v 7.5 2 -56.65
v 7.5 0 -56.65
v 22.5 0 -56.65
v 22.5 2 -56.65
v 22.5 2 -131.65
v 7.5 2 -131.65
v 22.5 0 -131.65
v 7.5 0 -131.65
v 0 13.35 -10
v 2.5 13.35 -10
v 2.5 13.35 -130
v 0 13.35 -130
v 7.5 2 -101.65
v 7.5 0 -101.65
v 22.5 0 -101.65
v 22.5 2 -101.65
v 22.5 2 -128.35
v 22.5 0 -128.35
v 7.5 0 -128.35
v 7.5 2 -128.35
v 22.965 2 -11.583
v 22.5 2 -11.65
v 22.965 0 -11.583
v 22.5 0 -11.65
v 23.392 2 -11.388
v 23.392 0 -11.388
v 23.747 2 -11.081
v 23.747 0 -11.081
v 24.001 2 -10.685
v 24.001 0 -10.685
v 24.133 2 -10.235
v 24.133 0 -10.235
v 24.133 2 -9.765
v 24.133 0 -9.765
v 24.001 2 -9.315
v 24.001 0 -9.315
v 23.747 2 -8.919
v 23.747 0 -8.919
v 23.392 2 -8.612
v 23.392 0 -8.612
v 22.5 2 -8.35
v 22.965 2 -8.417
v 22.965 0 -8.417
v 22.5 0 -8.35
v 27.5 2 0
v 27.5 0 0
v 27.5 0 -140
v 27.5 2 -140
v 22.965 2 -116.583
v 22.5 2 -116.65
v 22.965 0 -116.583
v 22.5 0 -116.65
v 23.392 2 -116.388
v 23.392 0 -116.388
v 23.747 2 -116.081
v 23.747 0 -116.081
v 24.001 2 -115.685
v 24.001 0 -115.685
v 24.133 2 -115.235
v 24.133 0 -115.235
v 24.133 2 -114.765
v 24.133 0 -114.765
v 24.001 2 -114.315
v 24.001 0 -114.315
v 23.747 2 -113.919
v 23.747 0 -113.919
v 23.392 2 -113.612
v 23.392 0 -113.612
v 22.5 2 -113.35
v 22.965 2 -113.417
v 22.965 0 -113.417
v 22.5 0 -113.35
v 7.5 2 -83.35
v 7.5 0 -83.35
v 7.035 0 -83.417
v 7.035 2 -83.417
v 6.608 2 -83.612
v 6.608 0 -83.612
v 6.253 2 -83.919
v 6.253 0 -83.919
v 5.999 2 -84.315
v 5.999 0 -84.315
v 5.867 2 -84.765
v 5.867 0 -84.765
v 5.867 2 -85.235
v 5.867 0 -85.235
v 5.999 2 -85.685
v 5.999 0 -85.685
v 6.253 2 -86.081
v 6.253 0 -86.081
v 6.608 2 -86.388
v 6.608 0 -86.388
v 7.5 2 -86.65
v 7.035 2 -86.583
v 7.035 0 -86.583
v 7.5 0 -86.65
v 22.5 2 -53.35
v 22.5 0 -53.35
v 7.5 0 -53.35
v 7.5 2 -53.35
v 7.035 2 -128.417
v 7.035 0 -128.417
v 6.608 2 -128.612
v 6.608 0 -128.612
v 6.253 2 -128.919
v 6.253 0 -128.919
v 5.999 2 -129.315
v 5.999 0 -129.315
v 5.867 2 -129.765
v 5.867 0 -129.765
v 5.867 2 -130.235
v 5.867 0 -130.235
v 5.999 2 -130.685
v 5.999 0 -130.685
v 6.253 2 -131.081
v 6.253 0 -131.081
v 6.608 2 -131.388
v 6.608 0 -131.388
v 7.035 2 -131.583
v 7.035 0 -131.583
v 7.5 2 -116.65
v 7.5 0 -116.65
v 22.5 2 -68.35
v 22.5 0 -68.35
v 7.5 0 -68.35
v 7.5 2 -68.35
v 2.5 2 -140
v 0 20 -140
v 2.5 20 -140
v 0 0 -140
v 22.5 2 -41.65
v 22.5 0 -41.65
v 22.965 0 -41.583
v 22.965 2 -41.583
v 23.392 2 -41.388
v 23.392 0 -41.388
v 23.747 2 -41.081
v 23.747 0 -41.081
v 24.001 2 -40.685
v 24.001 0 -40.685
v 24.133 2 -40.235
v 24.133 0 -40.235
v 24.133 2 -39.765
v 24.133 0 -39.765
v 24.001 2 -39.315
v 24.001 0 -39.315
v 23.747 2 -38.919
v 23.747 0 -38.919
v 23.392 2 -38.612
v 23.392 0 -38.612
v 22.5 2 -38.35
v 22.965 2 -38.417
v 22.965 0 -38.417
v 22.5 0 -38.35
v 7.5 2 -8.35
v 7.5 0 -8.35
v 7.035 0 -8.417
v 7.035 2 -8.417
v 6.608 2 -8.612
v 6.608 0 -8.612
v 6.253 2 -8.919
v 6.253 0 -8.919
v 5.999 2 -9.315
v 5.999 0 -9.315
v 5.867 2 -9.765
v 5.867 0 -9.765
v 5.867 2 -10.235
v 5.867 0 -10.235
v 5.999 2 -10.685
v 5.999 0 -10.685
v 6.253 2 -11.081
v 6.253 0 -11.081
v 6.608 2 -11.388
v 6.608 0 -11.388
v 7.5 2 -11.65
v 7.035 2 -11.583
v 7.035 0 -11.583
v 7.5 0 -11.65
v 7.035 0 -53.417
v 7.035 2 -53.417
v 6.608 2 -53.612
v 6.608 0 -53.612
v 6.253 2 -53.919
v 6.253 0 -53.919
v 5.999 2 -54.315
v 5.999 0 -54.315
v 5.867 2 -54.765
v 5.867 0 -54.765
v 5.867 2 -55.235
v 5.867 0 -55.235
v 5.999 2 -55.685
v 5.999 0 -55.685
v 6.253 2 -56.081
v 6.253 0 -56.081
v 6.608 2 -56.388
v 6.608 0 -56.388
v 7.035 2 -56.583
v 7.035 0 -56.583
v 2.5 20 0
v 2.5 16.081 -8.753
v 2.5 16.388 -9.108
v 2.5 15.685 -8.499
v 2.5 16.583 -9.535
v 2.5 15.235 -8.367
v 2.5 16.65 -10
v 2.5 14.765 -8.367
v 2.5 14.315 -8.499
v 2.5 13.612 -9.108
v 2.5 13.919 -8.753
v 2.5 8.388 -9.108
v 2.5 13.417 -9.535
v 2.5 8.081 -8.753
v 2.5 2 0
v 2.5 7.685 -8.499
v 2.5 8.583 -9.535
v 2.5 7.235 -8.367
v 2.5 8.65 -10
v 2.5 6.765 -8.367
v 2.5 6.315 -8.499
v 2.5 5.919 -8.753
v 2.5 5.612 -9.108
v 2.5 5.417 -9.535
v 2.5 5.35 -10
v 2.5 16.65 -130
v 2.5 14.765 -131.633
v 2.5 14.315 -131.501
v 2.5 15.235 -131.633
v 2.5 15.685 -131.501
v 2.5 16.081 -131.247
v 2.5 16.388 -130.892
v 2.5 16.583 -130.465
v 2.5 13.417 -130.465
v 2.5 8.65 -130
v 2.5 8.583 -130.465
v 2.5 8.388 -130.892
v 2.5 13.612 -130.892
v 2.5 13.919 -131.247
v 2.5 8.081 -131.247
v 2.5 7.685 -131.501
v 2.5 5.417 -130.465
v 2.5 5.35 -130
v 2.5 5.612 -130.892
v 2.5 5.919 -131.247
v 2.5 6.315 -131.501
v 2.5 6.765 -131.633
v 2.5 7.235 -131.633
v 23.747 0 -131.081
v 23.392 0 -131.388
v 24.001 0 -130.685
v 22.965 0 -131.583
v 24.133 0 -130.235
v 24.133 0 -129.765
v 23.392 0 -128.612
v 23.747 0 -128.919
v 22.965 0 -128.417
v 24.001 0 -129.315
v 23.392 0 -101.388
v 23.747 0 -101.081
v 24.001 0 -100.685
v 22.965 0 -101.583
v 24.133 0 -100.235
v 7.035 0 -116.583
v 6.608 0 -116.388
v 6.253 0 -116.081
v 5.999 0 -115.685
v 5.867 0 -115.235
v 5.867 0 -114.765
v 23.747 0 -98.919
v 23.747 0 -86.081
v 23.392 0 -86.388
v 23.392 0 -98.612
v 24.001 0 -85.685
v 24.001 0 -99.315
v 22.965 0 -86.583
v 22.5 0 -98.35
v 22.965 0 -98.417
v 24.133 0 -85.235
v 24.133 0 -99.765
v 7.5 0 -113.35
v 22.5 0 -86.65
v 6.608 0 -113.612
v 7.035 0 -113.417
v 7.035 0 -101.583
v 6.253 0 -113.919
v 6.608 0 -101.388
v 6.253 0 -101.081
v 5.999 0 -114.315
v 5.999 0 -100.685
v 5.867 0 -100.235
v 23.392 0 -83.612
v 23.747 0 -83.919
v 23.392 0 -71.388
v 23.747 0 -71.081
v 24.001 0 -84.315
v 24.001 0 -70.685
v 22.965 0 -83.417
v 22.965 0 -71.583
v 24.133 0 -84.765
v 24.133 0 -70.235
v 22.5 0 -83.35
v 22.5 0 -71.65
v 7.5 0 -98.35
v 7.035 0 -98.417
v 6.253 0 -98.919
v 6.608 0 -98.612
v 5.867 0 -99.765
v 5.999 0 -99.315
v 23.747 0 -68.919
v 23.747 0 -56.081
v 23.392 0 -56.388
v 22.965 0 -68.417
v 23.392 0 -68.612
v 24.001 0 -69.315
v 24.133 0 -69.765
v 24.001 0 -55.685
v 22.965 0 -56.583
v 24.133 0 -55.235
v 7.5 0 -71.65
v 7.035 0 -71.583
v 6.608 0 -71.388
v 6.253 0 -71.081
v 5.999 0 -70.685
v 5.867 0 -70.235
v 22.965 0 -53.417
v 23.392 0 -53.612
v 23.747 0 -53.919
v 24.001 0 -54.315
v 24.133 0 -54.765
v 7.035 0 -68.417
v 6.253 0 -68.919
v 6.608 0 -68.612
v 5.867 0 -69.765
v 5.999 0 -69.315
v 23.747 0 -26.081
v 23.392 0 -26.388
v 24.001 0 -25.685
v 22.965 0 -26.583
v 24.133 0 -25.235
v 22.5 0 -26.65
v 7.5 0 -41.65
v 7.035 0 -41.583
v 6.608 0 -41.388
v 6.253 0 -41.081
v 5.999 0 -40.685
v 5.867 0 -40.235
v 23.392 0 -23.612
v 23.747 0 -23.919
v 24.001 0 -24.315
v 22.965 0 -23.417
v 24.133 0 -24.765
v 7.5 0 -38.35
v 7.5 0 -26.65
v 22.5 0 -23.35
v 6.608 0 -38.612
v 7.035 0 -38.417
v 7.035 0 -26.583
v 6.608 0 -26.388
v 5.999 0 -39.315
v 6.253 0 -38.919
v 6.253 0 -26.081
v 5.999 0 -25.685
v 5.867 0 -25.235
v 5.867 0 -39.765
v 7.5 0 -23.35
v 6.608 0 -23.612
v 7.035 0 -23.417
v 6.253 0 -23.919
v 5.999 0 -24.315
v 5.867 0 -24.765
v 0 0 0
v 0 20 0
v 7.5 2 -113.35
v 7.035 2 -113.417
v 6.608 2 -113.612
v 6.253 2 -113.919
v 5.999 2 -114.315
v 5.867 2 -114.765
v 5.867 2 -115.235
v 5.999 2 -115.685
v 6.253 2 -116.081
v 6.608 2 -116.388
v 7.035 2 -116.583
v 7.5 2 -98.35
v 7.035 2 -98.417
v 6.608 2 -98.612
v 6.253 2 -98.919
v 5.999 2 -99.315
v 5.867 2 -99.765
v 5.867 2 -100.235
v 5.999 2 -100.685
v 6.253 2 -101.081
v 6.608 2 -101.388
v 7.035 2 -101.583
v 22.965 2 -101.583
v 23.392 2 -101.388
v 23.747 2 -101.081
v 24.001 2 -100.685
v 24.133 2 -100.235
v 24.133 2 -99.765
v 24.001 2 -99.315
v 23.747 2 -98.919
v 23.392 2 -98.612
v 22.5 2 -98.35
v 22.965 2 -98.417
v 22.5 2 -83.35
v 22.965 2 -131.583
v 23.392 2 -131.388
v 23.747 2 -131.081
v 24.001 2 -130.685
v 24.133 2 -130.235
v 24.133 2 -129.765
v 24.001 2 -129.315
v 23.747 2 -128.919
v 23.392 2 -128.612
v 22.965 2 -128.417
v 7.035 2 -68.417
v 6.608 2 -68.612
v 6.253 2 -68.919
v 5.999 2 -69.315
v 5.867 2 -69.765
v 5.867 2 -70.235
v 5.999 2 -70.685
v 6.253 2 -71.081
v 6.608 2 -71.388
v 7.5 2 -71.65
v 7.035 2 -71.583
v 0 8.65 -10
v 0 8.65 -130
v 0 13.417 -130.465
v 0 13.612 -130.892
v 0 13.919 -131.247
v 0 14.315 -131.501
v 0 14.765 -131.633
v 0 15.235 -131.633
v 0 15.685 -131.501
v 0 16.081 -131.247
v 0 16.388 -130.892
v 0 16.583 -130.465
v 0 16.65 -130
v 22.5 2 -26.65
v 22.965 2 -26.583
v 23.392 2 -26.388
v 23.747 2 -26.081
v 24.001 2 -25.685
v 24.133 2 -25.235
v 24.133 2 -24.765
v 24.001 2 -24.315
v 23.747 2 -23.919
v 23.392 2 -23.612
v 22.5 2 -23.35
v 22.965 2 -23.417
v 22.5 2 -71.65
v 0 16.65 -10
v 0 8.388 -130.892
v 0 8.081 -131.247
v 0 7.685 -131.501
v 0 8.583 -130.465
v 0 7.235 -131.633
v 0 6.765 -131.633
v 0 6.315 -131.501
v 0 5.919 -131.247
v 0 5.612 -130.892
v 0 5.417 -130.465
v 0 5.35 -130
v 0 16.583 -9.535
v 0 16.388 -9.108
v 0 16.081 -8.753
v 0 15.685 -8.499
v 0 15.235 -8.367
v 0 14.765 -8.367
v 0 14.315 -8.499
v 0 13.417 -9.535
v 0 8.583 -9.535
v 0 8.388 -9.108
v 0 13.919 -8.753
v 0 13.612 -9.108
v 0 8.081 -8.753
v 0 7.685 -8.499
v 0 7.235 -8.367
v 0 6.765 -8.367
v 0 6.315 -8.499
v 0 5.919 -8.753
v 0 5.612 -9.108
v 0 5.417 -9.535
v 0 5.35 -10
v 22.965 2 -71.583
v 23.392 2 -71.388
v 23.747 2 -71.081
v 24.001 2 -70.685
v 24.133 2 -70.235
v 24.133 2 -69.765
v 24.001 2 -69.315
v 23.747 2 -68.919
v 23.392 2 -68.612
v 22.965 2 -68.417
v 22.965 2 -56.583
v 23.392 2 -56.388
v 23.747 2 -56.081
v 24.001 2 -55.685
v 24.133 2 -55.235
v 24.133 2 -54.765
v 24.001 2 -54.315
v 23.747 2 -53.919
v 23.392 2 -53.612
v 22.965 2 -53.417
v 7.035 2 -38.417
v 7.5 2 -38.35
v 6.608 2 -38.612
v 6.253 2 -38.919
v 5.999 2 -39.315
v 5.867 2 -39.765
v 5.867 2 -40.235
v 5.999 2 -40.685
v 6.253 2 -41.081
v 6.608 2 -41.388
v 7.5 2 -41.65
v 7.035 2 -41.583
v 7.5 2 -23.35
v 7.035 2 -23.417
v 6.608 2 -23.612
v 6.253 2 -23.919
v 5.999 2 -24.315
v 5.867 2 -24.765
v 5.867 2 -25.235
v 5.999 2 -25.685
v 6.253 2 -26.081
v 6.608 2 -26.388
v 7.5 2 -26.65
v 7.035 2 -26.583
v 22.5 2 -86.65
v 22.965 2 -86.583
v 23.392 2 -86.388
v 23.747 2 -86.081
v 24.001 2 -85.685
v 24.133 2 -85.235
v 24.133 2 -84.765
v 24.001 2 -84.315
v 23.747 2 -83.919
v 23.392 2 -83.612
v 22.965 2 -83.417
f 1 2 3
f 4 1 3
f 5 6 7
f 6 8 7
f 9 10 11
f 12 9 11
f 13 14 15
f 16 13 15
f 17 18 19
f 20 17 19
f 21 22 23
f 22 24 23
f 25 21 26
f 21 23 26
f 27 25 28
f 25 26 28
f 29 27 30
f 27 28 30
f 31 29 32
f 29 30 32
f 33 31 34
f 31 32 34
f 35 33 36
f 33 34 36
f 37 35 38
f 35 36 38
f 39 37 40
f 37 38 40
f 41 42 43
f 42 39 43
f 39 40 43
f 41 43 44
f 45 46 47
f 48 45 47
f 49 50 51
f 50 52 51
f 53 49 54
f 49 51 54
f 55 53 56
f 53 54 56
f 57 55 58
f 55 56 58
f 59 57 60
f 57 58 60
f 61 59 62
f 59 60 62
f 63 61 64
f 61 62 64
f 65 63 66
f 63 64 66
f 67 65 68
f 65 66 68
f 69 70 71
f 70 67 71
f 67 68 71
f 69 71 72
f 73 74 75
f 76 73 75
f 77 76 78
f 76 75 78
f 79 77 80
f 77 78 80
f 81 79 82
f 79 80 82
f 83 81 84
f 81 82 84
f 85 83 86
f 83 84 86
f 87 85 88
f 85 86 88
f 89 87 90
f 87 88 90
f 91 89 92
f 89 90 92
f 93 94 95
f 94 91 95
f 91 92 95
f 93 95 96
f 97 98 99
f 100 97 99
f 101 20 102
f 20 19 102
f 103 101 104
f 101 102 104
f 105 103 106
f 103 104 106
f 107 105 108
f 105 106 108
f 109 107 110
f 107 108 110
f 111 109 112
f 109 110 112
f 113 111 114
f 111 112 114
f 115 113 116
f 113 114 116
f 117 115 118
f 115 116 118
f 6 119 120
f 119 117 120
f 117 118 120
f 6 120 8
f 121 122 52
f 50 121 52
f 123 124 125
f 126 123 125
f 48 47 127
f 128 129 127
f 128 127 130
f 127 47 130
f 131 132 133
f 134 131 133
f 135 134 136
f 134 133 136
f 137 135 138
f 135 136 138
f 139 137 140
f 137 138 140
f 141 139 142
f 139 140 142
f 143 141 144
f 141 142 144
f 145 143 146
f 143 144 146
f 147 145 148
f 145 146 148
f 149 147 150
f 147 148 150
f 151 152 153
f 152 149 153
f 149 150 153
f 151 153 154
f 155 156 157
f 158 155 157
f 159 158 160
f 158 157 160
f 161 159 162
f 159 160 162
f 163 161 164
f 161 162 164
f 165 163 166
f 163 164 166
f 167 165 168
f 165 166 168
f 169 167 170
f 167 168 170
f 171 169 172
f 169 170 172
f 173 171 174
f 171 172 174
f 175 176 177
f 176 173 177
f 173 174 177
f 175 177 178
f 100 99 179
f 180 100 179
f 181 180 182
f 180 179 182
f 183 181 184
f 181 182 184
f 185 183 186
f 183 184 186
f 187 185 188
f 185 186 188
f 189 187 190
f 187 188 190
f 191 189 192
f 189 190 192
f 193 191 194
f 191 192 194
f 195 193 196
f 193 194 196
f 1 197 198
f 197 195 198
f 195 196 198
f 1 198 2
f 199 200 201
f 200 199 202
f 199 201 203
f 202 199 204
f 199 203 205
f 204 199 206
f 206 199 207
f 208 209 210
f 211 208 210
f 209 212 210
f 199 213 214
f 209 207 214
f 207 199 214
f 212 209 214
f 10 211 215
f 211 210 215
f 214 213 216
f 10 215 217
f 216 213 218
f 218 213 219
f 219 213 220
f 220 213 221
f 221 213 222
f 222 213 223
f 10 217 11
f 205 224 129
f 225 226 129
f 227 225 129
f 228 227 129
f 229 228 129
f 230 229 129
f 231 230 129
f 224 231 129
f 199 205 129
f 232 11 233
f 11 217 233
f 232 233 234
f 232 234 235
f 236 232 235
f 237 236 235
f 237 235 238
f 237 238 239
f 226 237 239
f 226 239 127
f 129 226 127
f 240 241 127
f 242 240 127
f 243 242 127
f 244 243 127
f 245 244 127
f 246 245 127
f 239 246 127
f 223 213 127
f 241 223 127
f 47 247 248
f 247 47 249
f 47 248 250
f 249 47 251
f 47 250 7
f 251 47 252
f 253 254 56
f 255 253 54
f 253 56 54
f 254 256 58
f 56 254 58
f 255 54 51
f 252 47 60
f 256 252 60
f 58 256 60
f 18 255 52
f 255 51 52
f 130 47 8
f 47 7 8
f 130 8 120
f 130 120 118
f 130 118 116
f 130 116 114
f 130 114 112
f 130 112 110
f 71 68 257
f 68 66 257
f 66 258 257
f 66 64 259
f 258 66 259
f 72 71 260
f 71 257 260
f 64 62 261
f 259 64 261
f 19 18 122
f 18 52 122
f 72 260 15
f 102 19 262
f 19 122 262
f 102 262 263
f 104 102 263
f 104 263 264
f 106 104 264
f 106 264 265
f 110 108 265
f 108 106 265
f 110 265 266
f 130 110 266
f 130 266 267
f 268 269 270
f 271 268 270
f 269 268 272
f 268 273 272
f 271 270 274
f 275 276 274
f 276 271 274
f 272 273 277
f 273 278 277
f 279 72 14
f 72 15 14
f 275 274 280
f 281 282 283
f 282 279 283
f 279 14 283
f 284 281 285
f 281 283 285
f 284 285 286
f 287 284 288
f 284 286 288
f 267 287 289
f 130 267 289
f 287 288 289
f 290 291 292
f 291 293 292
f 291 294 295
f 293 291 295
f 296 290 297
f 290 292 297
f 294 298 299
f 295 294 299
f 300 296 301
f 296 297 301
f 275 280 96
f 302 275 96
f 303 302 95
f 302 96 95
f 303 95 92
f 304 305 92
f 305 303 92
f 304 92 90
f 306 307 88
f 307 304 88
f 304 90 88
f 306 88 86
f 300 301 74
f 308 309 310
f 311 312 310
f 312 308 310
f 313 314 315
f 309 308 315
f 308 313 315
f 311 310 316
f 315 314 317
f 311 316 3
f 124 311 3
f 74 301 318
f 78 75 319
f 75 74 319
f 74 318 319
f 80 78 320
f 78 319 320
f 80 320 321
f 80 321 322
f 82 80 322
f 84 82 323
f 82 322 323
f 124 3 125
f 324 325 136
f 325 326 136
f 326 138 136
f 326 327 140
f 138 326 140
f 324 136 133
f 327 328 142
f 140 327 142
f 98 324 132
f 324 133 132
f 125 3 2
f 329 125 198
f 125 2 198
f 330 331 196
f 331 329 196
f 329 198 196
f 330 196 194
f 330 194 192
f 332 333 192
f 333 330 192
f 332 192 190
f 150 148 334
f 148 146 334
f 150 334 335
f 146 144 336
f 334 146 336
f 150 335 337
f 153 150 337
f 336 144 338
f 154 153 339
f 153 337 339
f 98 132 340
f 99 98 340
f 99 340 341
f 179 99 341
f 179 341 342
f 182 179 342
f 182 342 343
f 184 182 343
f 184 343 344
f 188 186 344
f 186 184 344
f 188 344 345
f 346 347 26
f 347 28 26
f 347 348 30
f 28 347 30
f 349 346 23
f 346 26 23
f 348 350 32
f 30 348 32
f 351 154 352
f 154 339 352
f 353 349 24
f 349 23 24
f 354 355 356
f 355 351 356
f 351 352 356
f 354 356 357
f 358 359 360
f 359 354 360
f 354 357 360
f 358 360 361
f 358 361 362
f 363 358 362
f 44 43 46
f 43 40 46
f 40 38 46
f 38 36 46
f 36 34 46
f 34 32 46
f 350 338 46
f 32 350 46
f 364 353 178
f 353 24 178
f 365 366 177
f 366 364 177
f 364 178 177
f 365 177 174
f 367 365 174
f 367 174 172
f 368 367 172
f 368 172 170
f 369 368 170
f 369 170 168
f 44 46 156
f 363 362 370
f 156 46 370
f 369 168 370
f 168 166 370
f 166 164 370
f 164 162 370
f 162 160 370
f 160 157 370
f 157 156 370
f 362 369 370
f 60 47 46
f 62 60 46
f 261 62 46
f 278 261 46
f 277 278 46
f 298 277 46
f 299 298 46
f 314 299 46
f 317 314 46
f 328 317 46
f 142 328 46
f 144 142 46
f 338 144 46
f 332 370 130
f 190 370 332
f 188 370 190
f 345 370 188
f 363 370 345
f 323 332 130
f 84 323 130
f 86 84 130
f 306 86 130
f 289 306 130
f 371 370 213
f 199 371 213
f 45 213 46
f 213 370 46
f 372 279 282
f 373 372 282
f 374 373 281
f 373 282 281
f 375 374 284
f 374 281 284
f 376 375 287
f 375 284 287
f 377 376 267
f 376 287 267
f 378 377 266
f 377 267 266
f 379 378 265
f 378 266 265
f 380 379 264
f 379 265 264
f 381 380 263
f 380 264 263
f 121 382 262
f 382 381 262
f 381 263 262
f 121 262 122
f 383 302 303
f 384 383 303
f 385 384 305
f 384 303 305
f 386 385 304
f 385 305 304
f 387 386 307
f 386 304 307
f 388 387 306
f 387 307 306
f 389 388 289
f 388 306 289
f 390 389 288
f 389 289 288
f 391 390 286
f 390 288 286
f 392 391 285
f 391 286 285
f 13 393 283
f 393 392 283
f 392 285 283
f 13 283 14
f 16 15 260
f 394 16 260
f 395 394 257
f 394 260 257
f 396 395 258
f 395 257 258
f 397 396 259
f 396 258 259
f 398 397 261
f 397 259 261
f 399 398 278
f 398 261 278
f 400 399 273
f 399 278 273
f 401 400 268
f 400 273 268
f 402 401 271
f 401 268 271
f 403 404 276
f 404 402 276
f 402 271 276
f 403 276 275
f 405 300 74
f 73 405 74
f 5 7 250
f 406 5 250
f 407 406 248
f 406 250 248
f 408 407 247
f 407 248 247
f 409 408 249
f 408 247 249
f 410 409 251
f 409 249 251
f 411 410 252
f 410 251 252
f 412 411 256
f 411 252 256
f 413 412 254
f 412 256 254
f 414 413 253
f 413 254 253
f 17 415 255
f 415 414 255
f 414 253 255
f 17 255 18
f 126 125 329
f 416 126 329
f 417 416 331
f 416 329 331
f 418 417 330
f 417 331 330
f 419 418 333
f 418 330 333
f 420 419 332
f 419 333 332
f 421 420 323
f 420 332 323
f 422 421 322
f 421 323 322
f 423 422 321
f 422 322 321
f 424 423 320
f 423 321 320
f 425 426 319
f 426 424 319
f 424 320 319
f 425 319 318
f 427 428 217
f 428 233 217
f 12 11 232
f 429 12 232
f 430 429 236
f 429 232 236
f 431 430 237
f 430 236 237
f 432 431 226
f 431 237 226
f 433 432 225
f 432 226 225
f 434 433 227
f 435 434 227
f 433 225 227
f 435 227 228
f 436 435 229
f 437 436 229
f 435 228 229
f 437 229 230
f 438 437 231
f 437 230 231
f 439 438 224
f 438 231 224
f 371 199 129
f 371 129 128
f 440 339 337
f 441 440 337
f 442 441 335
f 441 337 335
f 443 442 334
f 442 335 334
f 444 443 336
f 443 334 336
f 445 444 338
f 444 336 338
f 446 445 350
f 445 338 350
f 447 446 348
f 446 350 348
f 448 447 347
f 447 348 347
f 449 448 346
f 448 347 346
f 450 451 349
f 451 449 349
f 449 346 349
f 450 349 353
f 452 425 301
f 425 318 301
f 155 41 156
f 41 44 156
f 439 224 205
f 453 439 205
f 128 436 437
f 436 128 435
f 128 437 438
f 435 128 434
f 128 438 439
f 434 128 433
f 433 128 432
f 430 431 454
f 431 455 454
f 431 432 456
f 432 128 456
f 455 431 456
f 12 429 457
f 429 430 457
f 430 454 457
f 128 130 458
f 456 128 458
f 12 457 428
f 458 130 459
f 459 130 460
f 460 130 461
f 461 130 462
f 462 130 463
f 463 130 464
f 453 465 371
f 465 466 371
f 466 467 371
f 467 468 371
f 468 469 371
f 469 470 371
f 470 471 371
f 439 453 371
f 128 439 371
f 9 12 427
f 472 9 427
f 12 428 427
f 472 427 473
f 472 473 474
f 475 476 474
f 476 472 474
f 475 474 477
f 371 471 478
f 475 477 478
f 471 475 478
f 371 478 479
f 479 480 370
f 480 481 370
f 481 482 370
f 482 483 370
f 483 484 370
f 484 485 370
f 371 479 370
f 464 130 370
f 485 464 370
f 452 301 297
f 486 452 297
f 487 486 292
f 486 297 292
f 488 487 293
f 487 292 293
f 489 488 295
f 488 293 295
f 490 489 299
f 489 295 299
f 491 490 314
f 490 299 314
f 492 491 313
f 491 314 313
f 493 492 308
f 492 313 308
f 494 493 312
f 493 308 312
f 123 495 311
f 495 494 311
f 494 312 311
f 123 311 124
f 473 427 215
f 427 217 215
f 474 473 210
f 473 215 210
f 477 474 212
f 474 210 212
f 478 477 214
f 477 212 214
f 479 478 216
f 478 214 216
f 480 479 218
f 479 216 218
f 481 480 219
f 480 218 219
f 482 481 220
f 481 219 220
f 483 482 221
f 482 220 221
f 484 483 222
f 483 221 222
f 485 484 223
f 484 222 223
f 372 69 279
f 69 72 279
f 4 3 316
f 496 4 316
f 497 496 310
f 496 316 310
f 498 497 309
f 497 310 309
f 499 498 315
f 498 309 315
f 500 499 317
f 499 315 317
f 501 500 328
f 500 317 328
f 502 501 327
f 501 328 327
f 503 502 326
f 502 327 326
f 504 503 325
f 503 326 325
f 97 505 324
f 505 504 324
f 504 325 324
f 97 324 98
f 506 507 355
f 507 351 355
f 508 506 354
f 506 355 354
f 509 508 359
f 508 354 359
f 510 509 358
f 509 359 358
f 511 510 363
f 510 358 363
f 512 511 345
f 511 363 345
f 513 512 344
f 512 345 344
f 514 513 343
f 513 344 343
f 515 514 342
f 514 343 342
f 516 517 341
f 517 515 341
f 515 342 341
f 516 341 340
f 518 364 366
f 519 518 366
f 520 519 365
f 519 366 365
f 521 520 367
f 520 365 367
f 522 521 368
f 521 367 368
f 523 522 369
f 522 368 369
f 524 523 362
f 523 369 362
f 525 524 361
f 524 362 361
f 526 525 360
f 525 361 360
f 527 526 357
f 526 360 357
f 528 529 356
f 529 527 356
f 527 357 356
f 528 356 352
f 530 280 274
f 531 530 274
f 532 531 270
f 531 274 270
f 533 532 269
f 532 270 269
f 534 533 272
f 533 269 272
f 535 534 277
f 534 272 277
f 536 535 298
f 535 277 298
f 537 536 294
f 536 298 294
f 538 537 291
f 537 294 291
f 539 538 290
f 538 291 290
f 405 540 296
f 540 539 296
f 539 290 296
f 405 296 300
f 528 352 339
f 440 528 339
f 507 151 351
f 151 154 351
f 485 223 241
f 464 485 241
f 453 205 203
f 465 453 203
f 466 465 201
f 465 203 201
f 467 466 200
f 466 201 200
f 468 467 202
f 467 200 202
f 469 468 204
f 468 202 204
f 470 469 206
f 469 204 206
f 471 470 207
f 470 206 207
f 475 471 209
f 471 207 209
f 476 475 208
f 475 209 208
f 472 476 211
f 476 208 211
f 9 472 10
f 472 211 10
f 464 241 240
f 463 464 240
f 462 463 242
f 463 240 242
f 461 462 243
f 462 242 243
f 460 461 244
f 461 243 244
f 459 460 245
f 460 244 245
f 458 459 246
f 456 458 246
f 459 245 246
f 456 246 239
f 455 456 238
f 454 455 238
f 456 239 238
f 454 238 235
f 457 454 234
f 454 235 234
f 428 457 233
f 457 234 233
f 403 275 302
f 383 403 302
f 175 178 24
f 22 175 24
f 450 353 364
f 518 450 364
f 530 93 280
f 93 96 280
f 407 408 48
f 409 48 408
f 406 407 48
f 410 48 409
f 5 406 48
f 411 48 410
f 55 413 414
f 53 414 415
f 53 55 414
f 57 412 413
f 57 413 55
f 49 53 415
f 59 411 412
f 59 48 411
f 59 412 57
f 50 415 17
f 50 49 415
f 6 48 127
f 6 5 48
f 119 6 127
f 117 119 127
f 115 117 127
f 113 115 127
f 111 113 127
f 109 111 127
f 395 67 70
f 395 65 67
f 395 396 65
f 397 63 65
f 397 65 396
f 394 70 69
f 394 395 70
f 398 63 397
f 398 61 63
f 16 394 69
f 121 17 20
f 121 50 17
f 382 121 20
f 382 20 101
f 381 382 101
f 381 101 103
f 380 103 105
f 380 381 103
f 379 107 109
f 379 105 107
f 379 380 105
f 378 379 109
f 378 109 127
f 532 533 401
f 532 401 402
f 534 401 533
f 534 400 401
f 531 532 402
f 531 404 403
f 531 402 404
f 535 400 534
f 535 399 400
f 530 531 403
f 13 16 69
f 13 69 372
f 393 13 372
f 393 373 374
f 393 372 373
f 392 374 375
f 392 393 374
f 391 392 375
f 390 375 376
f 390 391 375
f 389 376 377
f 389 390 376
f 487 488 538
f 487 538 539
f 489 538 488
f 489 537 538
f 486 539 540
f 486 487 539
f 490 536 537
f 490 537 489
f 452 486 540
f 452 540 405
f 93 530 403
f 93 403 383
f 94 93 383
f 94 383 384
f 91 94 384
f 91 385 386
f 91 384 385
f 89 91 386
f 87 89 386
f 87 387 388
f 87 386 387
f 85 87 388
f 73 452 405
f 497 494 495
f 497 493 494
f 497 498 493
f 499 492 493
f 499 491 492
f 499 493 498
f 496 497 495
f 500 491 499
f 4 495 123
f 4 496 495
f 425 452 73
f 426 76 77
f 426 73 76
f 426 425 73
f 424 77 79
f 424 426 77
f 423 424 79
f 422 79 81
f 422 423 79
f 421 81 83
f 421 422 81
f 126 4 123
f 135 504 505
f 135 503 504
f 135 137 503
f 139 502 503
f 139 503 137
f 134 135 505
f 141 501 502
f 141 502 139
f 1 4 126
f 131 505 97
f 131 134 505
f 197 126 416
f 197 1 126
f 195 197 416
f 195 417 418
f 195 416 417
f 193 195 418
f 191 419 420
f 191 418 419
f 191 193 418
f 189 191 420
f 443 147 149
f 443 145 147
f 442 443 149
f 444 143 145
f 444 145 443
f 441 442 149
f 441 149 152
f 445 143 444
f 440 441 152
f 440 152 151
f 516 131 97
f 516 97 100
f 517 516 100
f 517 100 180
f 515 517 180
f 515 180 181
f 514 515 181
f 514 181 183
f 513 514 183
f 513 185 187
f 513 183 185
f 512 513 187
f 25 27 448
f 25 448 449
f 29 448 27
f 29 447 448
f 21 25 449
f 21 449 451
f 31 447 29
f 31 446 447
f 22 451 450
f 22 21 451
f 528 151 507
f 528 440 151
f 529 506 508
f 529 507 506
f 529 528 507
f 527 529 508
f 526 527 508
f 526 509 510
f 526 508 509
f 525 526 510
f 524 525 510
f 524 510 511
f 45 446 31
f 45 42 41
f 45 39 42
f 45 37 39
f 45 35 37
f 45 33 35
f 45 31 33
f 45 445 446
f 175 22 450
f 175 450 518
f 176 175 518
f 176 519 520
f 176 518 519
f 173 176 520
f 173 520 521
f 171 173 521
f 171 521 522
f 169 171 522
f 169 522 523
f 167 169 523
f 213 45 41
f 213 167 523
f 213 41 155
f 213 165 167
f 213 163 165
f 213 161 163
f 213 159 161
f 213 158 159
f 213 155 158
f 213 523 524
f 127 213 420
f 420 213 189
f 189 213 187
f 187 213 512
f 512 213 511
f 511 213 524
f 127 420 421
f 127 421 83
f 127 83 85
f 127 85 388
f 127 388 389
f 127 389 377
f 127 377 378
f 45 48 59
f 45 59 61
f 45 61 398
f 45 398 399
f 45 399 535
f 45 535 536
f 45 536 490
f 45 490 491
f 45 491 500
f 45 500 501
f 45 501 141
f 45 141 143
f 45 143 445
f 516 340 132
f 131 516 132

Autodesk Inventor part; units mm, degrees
ref_plane "YZ Plane" through (0, 0, 0) normal (1, 0, 0) x (0, 1, 0)
ref_plane "XZ Plane" through (0, 0, 0) normal (0, 1, 0) x (-1, 0, 0)
ref_plane "XY Plane" through (0, 0, 0) normal (0, 0, 1) x (1, 0, 0)
sketch "Sketch1" plane through (0, 0, 0) normal (0, 1, 0) x (-1, 0, 0)
  line L0 (0, 0) -> (-27.5, 0)
  line L1 (-27.5, 0) -> (-27.5, -140)
  line L2 (-27.5, -140) -> (0, -140)
  line L3 (0, -140) -> (0, 0)
  line L4 (0, 0) -> (-2.5, 0)
  line L5 (-2.5, 0) -> (-2.5, -140)
  line L6 (-2.5, -140) -> (0, -140)
  line L7 (0, -140) -> (0, 0)
  arc A0 (-7.5, -11.65) -> (-7.5, -8.35) centre (-7.5, -10) ccw
  arc A1 (-22.5, -8.35) -> (-22.5, -11.65) centre (-22.5, -10) ccw
  line L8 (-7.5, -11.65) -> (-22.5, -11.65)
  line L9 (-22.5, -8.35) -> (-7.5, -8.35)
  arc A2 (-7.5, -26.65) -> (-7.5, -23.35) centre (-7.5, -25) ccw
  line L10 (-22.5, -23.35) -> (-7.5, -23.35)
  line L11 (-7.5, -26.65) -> (-22.5, -26.65)
  arc A3 (-22.5, -23.35) -> (-22.5, -26.65) centre (-22.5, -25) ccw
  arc A4 (-7.5, -41.65) -> (-7.5, -38.35) centre (-7.5, -40) ccw
  line L12 (-22.5, -38.35) -> (-7.5, -38.35)
  line L13 (-7.5, -41.65) -> (-22.5, -41.65)
  arc A5 (-22.5, -38.35) -> (-22.5, -41.65) centre (-22.5, -40) ccw
  arc A6 (-7.5, -56.65) -> (-7.5, -53.35) centre (-7.5, -55) ccw
  line L14 (-22.5, -53.35) -> (-7.5, -53.35)
  line L15 (-7.5, -56.65) -> (-22.5, -56.65)
  arc A7 (-22.5, -53.35) -> (-22.5, -56.65) centre (-22.5, -55) ccw
  arc A8 (-7.5, -71.65) -> (-7.5, -68.35) centre (-7.5, -70) ccw
  line L16 (-22.5, -68.35) -> (-7.5, -68.35)
  line L17 (-7.5, -71.65) -> (-22.5, -71.65)
  arc A9 (-22.5, -68.35) -> (-22.5, -71.65) centre (-22.5, -70) ccw
  arc A10 (-7.5, -86.65) -> (-7.5, -83.35) centre (-7.5, -85) ccw
  line L18 (-22.5, -83.35) -> (-7.5, -83.35)
  line L19 (-7.5, -86.65) -> (-22.5, -86.65)
  arc A11 (-22.5, -83.35) -> (-22.5, -86.65) centre (-22.5, -85) ccw
  arc A12 (-7.5, -101.65) -> (-7.5, -98.35) centre (-7.5, -100) ccw
  line L20 (-22.5, -98.35) -> (-7.5, -98.35)
  line L21 (-7.5, -101.65) -> (-22.5, -101.65)
  arc A13 (-22.5, -98.35) -> (-22.5, -101.65) centre (-22.5, -100) ccw
  arc A14 (-7.5, -116.65) -> (-7.5, -113.35) centre (-7.5, -115) ccw
  line L22 (-22.5, -113.35) -> (-7.5, -113.35)
  line L23 (-7.5, -116.65) -> (-22.5, -116.65)
  arc A15 (-22.5, -113.35) -> (-22.5, -116.65) centre (-22.5, -115) ccw
  arc A16 (-7.5, -131.65) -> (-7.5, -128.35) centre (-7.5, -130) ccw
  line L24 (-22.5, -128.35) -> (-7.5, -128.35)
  line L25 (-7.5, -131.65) -> (-22.5, -131.65)
  arc A17 (-22.5, -128.35) -> (-22.5, -131.65) centre (-22.5, -130) ccw
  dimension "d0" = 27.5
  dimension "d1" = 140
  dimension "d2" = 2.5
  dimension "d21" = 3.3
  dimension "d22" = 10
  dimension "d23" = 5
  dimension "d24" = 3.3
  dimension "d25" = 5
  dimension "d28" = 15
extrude "Extrusion1" add sketch "Sketch1" along normal blind 2 contours L5 L2 L1 L0
extrude "Extrusion2" add sketch "Sketch1" along normal blind 20 contours L3 L2 L5 L0
sketch "Sketch2" plane through (2.5, 2, -140) normal (1, 0, 0) x (0, 0, -1)
  circle A0 centre (-130, 5) radius 1.65
  line L0 (0, 0) -> (-140, 0) projected
  circle A1 centre (-130, 13) radius 1.65
  line L1 (-140, 18) -> (0, 18) projected
  line L2 (-140, 0) -> (-140, 18) projected
  line L3 (0, 0) -> (0, 18) projected
  line L4 (-130, 13) -> (-10, 13) construction
  line L5 (-130, 11.35) -> (-10, 11.35)
  line L6 (-10, 14.65) -> (-130, 14.65)
  arc A2 (-130, 14.65) -> (-130, 11.35) centre (-130, 13) ccw
  arc A3 (-10, 11.35) -> (-10, 14.65) centre (-10, 13) ccw
  line L7 (-130, 5) -> (-10, 5) construction
  line L8 (-130, 3.35) -> (-10, 3.35)
  line L9 (-10, 6.65) -> (-130, 6.65)
  arc A4 (-130, 6.65) -> (-130, 3.35) centre (-130, 5) ccw
  arc A5 (-10, 3.35) -> (-10, 6.65) centre (-10, 5) ccw
  point P0 (-140, -2)
  point P1 (-70, 13)
  point P2 (-70, 5)
  point P3 (-130, 6.65)
  point P4 (-130, 3.35)
  point P5 (-130, 14.65)
  point P6 (-130, 11.35)
  dimension "d7" = 3.3
  dimension "d8" = 5
  dimension "d9" = 3.3
  dimension "d10" = 5
  dimension "d11" = 10
  dimension "d12" = 10
  dimension "d15" = 3.3
  dimension "d16" = 3.3
  dimension "d19" = 120
  dimension "d20" = 120
extrude "Extrusion3" cut sketch "Sketch2" against normal blind 2.5 contours A0 | A0 L9 A5 L8 | A1 | A1 L6 A3 L5
properties part number "Alas Conveyor_3DPrint"
